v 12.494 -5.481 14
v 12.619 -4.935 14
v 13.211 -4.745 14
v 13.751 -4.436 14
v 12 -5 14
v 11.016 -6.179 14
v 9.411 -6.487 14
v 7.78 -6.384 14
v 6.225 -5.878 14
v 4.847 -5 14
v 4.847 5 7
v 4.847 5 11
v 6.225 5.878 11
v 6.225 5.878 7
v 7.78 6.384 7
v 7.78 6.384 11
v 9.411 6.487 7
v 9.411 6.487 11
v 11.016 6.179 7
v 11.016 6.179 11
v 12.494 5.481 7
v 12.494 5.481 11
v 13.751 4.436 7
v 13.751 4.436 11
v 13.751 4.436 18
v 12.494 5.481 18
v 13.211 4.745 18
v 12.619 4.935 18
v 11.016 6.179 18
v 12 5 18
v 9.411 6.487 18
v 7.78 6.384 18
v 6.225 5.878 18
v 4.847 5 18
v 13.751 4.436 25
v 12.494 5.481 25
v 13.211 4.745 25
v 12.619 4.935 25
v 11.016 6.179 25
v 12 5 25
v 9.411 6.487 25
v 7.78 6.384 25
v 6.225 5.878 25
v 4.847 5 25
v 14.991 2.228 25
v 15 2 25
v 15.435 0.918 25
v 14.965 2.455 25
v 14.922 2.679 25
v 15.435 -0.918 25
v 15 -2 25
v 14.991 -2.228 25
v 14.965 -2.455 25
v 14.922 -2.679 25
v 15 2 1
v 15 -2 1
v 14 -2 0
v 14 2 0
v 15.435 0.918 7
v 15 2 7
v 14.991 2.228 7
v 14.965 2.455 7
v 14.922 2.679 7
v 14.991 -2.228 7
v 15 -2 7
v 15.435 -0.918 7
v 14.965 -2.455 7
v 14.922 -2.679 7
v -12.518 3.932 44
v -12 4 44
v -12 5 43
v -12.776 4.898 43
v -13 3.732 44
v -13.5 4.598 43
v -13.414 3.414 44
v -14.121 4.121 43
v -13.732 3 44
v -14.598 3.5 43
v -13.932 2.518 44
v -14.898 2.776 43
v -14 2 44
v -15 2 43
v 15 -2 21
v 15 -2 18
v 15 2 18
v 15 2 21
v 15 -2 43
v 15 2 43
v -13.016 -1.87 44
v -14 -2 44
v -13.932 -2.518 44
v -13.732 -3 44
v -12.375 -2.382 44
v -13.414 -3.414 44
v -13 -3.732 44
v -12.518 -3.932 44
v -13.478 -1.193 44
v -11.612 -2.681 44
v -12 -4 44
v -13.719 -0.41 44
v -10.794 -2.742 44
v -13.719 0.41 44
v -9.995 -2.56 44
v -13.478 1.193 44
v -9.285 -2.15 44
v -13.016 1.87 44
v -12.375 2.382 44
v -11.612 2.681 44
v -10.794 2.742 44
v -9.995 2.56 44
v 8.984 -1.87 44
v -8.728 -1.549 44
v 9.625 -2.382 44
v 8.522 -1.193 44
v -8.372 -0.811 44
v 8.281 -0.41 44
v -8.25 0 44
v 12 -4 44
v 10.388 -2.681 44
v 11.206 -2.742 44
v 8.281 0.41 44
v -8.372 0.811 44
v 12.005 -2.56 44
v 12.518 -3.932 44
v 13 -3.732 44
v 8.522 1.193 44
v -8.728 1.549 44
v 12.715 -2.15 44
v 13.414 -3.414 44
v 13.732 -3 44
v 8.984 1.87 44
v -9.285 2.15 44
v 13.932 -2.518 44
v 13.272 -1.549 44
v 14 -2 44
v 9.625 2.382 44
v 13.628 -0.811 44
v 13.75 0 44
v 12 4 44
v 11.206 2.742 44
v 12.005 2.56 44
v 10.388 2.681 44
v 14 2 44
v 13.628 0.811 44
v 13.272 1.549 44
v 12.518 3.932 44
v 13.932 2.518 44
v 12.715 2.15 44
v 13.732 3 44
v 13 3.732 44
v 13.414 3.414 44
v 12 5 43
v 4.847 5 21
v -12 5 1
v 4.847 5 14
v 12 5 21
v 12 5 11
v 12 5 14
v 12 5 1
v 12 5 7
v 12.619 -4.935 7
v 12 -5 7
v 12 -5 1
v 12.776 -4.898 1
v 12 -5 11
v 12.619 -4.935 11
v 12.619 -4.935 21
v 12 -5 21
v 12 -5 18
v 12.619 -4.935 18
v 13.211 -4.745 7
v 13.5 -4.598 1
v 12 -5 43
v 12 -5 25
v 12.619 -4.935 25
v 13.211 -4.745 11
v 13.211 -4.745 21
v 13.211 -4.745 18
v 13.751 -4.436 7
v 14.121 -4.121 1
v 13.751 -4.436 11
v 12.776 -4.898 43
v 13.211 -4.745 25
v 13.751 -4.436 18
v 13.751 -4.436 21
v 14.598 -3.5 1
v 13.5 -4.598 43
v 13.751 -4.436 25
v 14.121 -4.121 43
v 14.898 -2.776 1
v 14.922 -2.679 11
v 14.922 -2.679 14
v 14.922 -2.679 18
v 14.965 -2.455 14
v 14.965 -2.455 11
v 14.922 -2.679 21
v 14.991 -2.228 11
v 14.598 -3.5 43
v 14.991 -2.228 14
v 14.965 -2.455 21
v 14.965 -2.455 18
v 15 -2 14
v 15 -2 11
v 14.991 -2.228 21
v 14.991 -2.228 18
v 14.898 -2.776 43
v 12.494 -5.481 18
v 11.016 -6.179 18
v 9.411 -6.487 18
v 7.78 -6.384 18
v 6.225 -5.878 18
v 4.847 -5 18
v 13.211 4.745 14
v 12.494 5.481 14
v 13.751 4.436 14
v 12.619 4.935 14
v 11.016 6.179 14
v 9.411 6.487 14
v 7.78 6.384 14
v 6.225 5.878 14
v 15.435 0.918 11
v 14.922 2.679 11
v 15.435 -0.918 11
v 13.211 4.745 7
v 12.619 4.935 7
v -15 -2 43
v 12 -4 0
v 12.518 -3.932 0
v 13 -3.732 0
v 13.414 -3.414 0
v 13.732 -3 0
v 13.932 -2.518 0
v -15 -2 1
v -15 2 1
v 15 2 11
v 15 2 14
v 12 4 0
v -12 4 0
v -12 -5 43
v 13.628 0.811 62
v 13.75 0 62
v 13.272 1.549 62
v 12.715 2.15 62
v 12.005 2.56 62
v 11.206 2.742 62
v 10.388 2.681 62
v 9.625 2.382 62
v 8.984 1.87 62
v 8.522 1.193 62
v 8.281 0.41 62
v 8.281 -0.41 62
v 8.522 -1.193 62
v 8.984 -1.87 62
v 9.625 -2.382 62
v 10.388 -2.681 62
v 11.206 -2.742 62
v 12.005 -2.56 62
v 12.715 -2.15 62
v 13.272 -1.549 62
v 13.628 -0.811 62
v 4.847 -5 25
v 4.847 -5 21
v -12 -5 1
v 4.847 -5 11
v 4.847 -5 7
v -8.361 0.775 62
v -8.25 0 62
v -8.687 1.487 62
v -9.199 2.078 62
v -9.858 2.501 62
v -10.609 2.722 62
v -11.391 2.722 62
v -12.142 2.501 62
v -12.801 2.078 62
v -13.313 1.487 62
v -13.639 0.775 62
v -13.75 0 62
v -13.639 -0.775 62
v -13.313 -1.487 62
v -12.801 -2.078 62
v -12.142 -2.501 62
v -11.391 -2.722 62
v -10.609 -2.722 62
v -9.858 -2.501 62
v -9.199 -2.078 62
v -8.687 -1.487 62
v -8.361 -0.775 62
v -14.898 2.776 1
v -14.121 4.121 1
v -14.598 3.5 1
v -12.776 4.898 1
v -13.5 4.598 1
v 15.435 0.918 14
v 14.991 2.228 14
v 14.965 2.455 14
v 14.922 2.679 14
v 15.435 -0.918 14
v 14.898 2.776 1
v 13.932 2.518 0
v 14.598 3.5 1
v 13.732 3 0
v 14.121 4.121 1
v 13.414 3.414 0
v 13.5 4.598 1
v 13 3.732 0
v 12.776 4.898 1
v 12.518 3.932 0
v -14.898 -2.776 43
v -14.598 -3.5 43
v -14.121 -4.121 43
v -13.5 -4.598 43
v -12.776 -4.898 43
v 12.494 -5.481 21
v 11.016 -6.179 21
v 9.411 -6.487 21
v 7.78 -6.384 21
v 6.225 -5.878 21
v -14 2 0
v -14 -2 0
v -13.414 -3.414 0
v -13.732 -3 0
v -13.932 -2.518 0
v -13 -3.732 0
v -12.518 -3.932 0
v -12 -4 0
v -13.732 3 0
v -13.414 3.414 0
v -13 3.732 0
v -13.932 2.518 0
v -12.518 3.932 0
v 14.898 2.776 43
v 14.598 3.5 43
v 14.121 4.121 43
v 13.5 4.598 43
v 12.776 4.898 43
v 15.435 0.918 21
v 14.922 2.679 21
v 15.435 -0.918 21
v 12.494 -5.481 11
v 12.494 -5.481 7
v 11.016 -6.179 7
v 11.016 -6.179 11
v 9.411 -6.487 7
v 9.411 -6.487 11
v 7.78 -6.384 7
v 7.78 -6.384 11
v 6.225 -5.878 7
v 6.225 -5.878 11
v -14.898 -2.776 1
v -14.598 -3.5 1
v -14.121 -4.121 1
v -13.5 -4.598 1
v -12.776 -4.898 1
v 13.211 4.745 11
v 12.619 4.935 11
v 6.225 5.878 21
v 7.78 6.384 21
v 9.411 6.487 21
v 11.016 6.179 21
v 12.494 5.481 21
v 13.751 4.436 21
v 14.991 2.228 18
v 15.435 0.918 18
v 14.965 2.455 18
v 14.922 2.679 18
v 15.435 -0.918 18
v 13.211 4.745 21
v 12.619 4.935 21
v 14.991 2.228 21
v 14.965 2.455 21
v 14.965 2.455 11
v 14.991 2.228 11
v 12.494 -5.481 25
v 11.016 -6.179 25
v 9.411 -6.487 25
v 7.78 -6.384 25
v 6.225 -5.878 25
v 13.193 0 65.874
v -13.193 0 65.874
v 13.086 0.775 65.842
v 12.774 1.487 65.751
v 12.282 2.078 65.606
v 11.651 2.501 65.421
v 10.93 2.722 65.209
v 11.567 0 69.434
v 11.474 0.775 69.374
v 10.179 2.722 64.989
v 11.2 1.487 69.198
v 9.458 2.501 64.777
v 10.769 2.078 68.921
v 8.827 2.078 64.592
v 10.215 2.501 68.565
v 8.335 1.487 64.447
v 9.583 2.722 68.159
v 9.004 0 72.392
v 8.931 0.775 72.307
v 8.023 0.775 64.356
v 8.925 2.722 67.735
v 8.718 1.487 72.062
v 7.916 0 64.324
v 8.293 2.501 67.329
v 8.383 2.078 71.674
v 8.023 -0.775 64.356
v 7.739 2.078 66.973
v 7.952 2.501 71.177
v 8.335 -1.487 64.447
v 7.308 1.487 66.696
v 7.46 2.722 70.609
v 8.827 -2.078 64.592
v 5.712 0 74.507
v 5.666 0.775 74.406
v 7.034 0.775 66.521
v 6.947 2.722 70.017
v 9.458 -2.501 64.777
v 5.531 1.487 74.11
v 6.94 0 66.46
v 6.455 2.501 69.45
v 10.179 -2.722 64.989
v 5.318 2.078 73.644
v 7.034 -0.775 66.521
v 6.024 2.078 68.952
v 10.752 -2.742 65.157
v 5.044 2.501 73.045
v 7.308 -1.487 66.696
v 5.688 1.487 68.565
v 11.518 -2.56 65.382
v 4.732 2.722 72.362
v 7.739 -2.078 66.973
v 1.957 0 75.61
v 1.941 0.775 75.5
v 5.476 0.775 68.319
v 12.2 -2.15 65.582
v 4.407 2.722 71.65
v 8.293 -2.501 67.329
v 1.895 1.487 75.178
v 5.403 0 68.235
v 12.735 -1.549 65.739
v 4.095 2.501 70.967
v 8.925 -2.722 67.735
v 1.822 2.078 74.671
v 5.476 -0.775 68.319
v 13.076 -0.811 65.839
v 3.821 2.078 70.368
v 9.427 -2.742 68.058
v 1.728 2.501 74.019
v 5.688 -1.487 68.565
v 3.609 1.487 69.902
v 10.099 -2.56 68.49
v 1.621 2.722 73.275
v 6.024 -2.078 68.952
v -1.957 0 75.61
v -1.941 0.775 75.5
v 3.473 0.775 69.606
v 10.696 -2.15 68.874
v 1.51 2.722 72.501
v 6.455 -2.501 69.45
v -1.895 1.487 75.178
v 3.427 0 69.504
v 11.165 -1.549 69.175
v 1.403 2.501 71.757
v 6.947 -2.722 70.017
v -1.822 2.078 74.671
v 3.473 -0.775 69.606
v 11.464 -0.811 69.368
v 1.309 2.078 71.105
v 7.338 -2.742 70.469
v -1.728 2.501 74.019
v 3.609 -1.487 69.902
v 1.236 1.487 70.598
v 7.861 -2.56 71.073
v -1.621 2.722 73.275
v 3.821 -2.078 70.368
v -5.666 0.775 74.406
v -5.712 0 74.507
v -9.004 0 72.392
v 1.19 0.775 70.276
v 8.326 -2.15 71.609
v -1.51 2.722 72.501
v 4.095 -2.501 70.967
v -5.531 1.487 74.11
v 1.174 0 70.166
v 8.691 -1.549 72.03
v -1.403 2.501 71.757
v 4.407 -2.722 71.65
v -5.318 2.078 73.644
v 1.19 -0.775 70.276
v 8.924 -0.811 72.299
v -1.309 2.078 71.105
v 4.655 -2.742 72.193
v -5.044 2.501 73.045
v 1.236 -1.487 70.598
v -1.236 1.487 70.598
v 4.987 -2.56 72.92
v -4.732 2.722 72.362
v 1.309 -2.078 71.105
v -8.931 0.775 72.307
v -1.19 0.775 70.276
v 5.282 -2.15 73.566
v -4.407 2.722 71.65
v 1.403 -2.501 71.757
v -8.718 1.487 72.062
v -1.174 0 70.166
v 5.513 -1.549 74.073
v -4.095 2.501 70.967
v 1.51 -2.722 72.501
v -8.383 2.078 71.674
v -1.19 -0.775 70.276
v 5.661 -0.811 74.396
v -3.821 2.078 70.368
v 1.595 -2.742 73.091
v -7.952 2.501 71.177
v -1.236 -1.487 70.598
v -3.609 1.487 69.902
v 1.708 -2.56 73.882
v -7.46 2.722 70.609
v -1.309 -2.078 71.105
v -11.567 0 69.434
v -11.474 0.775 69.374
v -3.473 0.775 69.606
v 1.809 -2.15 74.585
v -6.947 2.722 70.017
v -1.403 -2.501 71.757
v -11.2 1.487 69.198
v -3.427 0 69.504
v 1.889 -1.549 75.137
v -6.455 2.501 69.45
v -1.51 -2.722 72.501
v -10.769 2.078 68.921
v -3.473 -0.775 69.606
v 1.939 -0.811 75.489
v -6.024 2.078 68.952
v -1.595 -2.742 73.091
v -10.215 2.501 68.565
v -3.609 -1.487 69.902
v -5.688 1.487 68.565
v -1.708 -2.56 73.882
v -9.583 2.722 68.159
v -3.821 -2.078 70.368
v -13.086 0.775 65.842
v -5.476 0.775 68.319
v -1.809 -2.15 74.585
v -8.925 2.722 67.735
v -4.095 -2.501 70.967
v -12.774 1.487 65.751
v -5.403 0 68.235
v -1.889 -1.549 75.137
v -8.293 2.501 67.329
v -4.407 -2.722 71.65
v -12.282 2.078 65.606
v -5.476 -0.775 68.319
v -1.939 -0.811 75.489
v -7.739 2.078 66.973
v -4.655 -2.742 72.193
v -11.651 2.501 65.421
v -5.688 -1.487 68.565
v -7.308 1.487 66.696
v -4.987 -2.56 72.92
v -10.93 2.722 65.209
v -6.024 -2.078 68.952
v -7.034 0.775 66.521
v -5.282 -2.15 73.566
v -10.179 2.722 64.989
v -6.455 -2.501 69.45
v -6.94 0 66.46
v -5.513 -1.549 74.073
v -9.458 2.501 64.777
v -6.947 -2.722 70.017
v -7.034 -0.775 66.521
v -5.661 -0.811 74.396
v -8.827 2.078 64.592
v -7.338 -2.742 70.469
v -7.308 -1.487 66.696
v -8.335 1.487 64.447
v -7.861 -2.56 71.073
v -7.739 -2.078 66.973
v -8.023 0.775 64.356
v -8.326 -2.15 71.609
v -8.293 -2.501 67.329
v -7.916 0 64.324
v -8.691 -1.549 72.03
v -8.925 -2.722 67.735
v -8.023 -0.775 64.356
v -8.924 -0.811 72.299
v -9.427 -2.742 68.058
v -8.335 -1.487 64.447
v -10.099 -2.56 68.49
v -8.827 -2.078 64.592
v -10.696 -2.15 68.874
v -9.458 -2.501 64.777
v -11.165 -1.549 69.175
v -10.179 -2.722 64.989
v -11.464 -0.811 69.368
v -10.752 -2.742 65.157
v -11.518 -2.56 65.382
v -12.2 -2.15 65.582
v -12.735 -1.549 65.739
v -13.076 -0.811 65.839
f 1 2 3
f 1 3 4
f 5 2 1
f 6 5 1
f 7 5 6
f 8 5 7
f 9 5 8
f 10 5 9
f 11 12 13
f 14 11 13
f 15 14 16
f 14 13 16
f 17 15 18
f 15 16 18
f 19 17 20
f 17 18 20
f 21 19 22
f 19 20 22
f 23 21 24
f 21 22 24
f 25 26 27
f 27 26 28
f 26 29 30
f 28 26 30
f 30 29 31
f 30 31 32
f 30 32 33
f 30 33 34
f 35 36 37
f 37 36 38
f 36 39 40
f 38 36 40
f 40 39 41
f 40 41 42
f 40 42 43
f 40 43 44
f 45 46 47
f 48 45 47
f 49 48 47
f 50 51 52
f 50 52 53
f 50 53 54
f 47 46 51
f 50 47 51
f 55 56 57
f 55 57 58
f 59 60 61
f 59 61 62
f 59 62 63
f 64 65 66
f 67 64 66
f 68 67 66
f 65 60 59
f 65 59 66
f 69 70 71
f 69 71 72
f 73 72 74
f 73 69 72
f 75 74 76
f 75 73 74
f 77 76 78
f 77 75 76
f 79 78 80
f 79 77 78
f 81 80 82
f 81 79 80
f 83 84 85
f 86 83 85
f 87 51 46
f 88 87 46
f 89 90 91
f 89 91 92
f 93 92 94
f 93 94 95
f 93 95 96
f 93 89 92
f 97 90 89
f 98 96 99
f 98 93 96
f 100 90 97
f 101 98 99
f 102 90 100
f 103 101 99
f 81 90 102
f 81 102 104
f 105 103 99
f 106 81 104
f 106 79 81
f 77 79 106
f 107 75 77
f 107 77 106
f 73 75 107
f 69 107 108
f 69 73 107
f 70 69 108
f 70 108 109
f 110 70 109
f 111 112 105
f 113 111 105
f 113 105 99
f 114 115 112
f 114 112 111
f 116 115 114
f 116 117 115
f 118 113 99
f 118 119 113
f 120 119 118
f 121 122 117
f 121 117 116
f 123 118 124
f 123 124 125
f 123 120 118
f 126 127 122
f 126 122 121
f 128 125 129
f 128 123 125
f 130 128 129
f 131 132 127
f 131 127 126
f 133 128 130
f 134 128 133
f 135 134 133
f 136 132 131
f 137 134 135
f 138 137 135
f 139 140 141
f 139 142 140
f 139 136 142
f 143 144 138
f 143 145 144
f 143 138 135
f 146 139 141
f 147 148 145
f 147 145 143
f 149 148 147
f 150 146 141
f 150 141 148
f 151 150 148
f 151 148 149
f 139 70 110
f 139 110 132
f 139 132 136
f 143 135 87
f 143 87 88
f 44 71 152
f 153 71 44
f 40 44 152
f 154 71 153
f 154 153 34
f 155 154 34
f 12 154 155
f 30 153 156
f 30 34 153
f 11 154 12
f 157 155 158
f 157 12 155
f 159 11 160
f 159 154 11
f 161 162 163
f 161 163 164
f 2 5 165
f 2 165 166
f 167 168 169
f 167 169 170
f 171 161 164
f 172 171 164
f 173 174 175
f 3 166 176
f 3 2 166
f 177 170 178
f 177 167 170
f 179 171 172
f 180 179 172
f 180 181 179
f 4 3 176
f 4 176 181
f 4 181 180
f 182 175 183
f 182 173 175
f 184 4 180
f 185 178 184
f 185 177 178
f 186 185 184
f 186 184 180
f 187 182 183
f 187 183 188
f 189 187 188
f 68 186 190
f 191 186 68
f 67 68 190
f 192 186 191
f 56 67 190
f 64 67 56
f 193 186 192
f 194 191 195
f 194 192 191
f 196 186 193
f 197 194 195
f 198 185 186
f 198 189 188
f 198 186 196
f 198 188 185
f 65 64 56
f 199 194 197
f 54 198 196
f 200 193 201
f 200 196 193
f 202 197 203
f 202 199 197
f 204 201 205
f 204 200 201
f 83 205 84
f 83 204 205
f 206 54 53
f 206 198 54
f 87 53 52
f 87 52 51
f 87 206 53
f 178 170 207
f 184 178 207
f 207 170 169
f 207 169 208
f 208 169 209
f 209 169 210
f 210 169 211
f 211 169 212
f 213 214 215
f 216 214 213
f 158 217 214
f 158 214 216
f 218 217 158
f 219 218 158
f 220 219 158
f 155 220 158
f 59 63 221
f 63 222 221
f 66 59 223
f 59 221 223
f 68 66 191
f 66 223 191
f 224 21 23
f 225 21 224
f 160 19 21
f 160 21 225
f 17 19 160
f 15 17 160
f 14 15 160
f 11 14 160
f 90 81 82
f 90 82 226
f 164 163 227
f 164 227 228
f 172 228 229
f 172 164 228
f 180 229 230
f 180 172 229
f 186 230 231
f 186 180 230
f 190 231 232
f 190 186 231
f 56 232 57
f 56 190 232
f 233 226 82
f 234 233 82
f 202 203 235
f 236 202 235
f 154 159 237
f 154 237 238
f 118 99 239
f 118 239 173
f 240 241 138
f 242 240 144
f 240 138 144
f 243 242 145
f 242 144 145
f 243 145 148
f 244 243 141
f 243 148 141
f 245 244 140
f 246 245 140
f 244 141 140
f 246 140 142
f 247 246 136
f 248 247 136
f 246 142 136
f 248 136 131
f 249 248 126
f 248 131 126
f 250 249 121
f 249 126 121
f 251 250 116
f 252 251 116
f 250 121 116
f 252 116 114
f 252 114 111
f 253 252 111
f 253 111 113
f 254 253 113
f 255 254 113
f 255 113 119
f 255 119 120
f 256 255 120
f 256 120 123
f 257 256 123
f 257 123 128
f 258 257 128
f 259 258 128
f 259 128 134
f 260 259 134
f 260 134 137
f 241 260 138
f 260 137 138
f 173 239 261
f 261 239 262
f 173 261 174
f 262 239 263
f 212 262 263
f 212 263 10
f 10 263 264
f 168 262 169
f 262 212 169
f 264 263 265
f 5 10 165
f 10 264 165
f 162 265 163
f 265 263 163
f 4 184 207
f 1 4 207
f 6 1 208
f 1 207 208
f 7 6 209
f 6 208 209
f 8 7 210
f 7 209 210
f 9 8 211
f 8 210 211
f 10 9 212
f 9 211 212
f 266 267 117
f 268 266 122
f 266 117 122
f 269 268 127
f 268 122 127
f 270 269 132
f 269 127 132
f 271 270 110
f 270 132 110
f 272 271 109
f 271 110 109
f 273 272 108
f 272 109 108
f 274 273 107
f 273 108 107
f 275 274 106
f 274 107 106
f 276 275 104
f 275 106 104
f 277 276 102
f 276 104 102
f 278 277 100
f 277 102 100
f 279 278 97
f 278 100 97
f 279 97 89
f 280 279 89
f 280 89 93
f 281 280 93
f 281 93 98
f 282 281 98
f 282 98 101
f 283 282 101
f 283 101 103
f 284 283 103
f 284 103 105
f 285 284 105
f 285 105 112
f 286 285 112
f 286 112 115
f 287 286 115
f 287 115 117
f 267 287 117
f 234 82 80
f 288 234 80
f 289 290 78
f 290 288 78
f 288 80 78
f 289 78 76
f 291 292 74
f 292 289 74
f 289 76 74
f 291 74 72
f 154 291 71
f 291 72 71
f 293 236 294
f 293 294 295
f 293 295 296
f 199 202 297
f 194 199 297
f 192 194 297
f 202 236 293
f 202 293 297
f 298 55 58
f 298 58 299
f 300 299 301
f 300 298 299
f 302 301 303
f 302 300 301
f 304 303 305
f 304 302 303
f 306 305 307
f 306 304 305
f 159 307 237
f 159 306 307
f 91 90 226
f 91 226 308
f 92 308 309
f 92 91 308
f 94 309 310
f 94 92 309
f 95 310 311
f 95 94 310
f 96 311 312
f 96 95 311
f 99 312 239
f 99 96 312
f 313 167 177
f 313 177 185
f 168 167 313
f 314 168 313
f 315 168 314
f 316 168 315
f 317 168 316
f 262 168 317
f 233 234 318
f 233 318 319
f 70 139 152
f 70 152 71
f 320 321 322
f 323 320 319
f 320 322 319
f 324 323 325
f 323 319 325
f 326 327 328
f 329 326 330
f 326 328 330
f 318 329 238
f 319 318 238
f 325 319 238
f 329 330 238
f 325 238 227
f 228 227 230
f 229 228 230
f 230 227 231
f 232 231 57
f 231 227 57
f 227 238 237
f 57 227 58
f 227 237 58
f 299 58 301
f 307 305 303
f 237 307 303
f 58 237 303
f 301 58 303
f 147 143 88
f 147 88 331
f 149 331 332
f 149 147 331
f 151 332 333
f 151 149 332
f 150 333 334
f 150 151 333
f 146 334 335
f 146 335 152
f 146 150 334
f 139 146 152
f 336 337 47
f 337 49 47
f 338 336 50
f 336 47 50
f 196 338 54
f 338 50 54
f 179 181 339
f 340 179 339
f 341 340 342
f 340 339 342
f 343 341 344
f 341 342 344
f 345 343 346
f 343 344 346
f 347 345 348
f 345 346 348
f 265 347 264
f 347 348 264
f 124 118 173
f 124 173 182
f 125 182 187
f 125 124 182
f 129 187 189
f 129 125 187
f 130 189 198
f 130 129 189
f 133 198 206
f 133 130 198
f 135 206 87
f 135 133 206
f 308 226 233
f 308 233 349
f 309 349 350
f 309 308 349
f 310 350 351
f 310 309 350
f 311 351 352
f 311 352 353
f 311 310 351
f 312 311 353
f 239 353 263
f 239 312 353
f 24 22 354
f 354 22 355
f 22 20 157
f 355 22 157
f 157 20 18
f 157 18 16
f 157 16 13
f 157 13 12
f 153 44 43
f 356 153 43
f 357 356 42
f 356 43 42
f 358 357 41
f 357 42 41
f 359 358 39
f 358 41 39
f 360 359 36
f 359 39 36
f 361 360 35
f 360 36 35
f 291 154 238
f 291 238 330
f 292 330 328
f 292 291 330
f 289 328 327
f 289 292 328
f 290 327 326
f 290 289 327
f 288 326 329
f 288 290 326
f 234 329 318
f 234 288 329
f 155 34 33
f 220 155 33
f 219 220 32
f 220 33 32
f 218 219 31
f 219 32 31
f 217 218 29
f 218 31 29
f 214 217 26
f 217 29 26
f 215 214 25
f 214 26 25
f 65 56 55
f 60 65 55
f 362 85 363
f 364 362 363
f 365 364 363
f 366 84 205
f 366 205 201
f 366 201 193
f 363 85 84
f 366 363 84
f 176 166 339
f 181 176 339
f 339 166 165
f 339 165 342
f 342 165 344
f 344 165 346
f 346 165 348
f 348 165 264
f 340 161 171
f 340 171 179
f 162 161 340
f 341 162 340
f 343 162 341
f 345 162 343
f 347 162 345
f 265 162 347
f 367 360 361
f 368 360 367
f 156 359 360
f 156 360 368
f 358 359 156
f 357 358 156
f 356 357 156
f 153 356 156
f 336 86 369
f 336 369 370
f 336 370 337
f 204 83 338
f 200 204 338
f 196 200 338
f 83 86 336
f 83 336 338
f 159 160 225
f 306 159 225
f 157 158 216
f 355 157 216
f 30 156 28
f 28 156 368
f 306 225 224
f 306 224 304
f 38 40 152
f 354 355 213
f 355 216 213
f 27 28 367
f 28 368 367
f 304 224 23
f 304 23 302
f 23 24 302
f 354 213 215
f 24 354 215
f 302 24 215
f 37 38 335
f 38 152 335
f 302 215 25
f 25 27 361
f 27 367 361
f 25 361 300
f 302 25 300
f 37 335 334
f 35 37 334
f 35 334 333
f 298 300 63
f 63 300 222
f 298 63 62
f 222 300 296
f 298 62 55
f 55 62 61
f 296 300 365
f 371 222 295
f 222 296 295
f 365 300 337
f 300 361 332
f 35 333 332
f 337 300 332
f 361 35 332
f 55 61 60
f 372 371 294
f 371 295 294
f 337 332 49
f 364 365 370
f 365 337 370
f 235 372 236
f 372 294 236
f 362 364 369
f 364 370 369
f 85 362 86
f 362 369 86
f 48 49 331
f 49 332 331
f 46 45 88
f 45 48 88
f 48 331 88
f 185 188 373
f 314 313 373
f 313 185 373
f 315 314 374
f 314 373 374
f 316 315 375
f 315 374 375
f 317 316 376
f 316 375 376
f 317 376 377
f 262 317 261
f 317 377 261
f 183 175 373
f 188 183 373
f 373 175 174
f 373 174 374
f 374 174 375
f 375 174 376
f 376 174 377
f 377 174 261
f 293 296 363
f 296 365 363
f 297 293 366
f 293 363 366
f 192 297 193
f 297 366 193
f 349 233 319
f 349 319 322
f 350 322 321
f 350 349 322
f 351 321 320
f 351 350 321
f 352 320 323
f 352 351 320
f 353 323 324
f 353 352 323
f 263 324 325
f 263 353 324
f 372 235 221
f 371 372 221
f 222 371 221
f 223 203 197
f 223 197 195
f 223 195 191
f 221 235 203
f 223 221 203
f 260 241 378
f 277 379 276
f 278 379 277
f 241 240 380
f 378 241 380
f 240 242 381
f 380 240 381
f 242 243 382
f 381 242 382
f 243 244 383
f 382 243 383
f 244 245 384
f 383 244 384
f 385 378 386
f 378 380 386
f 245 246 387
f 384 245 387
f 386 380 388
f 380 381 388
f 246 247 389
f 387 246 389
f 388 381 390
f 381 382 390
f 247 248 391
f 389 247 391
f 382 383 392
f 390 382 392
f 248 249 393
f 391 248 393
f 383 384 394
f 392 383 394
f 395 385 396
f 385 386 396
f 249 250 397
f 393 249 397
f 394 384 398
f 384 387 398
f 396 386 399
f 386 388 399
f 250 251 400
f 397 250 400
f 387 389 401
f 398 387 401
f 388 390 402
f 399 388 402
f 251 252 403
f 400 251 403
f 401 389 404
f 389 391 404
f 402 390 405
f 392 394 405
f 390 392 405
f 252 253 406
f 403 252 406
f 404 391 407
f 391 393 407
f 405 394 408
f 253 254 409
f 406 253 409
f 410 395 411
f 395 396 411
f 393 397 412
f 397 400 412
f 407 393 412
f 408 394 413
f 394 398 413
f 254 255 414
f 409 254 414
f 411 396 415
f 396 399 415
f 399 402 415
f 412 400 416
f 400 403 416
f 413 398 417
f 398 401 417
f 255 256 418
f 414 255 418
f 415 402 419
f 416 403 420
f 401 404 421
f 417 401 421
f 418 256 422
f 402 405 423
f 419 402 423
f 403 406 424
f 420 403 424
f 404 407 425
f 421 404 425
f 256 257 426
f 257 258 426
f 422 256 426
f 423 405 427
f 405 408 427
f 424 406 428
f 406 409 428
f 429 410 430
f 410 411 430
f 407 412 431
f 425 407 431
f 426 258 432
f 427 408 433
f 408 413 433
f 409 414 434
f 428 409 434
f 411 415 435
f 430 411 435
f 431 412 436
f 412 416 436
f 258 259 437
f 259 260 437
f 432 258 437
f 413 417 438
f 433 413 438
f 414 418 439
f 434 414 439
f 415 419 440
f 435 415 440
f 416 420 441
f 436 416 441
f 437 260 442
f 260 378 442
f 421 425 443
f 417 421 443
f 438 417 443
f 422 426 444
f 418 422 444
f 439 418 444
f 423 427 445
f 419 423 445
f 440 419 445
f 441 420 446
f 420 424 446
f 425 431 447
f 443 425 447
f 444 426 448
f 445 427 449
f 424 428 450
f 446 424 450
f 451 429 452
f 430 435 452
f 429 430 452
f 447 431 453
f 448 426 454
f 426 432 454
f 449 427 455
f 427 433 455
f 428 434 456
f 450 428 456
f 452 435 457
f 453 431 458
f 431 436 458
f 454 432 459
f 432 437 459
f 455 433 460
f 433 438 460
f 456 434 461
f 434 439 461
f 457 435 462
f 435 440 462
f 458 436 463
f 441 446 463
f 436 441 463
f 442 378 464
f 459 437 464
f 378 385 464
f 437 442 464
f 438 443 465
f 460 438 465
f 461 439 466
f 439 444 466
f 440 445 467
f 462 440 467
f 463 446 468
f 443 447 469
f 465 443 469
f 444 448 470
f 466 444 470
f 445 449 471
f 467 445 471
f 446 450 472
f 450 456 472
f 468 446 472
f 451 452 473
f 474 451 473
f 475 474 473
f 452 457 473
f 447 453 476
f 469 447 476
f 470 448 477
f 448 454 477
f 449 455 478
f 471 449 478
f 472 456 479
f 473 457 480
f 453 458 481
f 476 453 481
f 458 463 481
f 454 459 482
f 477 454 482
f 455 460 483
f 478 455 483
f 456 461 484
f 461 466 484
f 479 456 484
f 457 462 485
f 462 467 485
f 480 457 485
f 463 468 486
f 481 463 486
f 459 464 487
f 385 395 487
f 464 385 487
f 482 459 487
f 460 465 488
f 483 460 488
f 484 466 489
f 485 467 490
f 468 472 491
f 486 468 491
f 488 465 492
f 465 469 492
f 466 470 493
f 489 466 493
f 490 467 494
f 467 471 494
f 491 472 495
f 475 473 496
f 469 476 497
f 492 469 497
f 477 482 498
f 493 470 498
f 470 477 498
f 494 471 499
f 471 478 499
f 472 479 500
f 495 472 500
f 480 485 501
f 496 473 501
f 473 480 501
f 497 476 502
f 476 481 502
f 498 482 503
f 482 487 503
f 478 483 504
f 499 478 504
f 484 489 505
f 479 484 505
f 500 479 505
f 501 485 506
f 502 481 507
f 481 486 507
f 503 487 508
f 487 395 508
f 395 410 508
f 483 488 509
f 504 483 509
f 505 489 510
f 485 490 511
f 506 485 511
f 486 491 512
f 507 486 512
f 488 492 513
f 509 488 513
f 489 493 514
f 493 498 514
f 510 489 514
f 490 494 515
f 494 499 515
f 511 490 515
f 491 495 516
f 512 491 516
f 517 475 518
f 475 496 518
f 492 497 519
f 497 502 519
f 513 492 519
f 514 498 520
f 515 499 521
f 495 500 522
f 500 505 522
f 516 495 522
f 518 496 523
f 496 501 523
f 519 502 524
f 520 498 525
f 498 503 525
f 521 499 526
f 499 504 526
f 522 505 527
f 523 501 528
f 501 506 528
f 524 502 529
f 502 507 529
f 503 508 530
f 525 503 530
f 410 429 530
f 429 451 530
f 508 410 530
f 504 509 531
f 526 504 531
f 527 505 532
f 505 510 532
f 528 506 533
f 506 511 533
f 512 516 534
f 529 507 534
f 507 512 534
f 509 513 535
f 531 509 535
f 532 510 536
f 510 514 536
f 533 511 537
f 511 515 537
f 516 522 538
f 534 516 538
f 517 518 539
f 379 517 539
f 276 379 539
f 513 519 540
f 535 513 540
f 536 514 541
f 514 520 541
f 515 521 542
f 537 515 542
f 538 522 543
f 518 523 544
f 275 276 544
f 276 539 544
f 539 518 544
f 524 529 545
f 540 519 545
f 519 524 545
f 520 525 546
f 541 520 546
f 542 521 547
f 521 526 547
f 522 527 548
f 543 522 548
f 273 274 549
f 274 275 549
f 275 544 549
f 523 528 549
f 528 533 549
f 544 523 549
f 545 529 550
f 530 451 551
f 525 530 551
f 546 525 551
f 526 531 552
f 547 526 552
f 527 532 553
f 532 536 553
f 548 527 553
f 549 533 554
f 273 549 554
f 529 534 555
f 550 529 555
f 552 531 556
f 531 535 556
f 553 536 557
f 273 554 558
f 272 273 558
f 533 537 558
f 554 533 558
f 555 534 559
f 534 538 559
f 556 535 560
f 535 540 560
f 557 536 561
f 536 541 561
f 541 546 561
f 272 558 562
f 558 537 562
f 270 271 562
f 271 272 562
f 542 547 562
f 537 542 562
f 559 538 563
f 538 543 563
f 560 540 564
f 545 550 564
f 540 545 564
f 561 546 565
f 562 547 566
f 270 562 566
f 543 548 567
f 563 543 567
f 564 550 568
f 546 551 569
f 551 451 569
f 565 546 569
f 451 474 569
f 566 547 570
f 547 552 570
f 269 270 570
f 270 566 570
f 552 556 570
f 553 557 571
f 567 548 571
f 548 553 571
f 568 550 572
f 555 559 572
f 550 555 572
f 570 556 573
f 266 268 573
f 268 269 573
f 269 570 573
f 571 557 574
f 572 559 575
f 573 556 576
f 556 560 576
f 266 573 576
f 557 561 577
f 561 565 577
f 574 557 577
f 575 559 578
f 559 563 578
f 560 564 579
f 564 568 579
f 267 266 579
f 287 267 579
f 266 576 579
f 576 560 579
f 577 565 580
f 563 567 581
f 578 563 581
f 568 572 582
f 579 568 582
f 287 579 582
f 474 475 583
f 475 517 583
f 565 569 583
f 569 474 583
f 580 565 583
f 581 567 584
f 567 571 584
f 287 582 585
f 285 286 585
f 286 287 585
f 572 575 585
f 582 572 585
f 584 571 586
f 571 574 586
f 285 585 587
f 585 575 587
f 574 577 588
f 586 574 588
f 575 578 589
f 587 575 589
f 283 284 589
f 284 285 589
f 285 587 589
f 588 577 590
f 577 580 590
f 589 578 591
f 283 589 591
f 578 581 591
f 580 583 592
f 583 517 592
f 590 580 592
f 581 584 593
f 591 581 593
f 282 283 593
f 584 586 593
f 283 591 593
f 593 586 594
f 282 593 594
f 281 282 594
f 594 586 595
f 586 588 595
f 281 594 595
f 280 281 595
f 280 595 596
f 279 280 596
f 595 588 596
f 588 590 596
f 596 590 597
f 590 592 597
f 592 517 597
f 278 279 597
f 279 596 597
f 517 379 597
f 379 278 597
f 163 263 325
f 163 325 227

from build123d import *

# Parameters (mm, degrees)
F0_W     = 30
F0_H     = 10
F1_DEPTH = 44
F2_R     = 3
F3_R     = 3
F5_START = 44
F4_R     = 2.75
F5_DEPTH = 18
F7_R     = 2.75
F8_ANGLE = 180
F10_W    = 6.5
F10_H    = 4
F12_SIZE = 1
F13_SIZE = 1


with BuildPart() as f1:
    # F0 (on Top) → F1 (new body)
    with BuildSketch(Plane.XY):
        Rectangle(F0_W, F0_H)
    extrude(amount=F1_DEPTH)

    # F2
    f2_edges = [f1.edges().sort_by_distance(p)[0] for p in [
        (15, -5, 22),
        (-15, -5, 22),
    ]]
    fillet(f2_edges, radius=F2_R)

    # F3
    f3_edges = [f1.edges().sort_by_distance(p)[0] for p in [
        (15, 5, 22),
        (-15, 5, 22),
    ]]
    fillet(f3_edges, radius=F3_R)

    # F4 (on Top) → F5 (join)
    with BuildSketch(Plane.XY.offset(F5_START)):
        with Locations((-11, 0)):
            Circle(F4_R)
        with Locations((11, 0)):
            Circle(F4_R)
    extrude(amount=F5_DEPTH)

    # F7 (on offset) → F8 (revolve)
    with BuildSketch(Plane.XY.offset(62)):
        with Locations((11, 0)):
            Circle(F7_R)
    revolve(axis=Axis((0, -1.5820115805, 62), (0, -1, 0)), revolution_arc=F8_ANGLE)

    # F10 (on offset) → F11 (revolve)
    with BuildSketch(Plane.YZ.offset(9)):
        with Locations((-3.25, 23)):
            Rectangle(F10_W, F10_H)
        with Locations((-3.25, 16)):
            Rectangle(F10_W, F10_H)
        with Locations((-3.25, 9)):
            Rectangle(F10_W, F10_H)
    revolve(axis=Axis((9, 0, 12.7572556958), (0, 0, -1)))

    # F12
    f12_edges = [f1.edges().sort_by_distance(p)[0] for p in [
        (15, 0, 44),
        (14.12132, 4.12132, 44),
        (14.12132, -4.12132, 44),
        (-14.12132, 4.12132, 44),
        (-15, 0, 44),
        (-14.12132, -4.12132, 44),
    ]]
    chamfer(f12_edges, length=F12_SIZE)

    # F13
    f13_edges = [f1.edges().sort_by_distance(p)[0] for p in [
        (15, 0, 0),
        (14.12132, 4.12132, 0),
        (14.12132, -4.12132, 0),
        (0, 5, 0),
        (0, -5, 0),
        (-14.12132, 4.12132, 0),
        (-14.12132, -4.12132, 0),
        (-15, 0, 0),
    ]]
    chamfer(f13_edges, length=F13_SIZE)


solid = f1.part
